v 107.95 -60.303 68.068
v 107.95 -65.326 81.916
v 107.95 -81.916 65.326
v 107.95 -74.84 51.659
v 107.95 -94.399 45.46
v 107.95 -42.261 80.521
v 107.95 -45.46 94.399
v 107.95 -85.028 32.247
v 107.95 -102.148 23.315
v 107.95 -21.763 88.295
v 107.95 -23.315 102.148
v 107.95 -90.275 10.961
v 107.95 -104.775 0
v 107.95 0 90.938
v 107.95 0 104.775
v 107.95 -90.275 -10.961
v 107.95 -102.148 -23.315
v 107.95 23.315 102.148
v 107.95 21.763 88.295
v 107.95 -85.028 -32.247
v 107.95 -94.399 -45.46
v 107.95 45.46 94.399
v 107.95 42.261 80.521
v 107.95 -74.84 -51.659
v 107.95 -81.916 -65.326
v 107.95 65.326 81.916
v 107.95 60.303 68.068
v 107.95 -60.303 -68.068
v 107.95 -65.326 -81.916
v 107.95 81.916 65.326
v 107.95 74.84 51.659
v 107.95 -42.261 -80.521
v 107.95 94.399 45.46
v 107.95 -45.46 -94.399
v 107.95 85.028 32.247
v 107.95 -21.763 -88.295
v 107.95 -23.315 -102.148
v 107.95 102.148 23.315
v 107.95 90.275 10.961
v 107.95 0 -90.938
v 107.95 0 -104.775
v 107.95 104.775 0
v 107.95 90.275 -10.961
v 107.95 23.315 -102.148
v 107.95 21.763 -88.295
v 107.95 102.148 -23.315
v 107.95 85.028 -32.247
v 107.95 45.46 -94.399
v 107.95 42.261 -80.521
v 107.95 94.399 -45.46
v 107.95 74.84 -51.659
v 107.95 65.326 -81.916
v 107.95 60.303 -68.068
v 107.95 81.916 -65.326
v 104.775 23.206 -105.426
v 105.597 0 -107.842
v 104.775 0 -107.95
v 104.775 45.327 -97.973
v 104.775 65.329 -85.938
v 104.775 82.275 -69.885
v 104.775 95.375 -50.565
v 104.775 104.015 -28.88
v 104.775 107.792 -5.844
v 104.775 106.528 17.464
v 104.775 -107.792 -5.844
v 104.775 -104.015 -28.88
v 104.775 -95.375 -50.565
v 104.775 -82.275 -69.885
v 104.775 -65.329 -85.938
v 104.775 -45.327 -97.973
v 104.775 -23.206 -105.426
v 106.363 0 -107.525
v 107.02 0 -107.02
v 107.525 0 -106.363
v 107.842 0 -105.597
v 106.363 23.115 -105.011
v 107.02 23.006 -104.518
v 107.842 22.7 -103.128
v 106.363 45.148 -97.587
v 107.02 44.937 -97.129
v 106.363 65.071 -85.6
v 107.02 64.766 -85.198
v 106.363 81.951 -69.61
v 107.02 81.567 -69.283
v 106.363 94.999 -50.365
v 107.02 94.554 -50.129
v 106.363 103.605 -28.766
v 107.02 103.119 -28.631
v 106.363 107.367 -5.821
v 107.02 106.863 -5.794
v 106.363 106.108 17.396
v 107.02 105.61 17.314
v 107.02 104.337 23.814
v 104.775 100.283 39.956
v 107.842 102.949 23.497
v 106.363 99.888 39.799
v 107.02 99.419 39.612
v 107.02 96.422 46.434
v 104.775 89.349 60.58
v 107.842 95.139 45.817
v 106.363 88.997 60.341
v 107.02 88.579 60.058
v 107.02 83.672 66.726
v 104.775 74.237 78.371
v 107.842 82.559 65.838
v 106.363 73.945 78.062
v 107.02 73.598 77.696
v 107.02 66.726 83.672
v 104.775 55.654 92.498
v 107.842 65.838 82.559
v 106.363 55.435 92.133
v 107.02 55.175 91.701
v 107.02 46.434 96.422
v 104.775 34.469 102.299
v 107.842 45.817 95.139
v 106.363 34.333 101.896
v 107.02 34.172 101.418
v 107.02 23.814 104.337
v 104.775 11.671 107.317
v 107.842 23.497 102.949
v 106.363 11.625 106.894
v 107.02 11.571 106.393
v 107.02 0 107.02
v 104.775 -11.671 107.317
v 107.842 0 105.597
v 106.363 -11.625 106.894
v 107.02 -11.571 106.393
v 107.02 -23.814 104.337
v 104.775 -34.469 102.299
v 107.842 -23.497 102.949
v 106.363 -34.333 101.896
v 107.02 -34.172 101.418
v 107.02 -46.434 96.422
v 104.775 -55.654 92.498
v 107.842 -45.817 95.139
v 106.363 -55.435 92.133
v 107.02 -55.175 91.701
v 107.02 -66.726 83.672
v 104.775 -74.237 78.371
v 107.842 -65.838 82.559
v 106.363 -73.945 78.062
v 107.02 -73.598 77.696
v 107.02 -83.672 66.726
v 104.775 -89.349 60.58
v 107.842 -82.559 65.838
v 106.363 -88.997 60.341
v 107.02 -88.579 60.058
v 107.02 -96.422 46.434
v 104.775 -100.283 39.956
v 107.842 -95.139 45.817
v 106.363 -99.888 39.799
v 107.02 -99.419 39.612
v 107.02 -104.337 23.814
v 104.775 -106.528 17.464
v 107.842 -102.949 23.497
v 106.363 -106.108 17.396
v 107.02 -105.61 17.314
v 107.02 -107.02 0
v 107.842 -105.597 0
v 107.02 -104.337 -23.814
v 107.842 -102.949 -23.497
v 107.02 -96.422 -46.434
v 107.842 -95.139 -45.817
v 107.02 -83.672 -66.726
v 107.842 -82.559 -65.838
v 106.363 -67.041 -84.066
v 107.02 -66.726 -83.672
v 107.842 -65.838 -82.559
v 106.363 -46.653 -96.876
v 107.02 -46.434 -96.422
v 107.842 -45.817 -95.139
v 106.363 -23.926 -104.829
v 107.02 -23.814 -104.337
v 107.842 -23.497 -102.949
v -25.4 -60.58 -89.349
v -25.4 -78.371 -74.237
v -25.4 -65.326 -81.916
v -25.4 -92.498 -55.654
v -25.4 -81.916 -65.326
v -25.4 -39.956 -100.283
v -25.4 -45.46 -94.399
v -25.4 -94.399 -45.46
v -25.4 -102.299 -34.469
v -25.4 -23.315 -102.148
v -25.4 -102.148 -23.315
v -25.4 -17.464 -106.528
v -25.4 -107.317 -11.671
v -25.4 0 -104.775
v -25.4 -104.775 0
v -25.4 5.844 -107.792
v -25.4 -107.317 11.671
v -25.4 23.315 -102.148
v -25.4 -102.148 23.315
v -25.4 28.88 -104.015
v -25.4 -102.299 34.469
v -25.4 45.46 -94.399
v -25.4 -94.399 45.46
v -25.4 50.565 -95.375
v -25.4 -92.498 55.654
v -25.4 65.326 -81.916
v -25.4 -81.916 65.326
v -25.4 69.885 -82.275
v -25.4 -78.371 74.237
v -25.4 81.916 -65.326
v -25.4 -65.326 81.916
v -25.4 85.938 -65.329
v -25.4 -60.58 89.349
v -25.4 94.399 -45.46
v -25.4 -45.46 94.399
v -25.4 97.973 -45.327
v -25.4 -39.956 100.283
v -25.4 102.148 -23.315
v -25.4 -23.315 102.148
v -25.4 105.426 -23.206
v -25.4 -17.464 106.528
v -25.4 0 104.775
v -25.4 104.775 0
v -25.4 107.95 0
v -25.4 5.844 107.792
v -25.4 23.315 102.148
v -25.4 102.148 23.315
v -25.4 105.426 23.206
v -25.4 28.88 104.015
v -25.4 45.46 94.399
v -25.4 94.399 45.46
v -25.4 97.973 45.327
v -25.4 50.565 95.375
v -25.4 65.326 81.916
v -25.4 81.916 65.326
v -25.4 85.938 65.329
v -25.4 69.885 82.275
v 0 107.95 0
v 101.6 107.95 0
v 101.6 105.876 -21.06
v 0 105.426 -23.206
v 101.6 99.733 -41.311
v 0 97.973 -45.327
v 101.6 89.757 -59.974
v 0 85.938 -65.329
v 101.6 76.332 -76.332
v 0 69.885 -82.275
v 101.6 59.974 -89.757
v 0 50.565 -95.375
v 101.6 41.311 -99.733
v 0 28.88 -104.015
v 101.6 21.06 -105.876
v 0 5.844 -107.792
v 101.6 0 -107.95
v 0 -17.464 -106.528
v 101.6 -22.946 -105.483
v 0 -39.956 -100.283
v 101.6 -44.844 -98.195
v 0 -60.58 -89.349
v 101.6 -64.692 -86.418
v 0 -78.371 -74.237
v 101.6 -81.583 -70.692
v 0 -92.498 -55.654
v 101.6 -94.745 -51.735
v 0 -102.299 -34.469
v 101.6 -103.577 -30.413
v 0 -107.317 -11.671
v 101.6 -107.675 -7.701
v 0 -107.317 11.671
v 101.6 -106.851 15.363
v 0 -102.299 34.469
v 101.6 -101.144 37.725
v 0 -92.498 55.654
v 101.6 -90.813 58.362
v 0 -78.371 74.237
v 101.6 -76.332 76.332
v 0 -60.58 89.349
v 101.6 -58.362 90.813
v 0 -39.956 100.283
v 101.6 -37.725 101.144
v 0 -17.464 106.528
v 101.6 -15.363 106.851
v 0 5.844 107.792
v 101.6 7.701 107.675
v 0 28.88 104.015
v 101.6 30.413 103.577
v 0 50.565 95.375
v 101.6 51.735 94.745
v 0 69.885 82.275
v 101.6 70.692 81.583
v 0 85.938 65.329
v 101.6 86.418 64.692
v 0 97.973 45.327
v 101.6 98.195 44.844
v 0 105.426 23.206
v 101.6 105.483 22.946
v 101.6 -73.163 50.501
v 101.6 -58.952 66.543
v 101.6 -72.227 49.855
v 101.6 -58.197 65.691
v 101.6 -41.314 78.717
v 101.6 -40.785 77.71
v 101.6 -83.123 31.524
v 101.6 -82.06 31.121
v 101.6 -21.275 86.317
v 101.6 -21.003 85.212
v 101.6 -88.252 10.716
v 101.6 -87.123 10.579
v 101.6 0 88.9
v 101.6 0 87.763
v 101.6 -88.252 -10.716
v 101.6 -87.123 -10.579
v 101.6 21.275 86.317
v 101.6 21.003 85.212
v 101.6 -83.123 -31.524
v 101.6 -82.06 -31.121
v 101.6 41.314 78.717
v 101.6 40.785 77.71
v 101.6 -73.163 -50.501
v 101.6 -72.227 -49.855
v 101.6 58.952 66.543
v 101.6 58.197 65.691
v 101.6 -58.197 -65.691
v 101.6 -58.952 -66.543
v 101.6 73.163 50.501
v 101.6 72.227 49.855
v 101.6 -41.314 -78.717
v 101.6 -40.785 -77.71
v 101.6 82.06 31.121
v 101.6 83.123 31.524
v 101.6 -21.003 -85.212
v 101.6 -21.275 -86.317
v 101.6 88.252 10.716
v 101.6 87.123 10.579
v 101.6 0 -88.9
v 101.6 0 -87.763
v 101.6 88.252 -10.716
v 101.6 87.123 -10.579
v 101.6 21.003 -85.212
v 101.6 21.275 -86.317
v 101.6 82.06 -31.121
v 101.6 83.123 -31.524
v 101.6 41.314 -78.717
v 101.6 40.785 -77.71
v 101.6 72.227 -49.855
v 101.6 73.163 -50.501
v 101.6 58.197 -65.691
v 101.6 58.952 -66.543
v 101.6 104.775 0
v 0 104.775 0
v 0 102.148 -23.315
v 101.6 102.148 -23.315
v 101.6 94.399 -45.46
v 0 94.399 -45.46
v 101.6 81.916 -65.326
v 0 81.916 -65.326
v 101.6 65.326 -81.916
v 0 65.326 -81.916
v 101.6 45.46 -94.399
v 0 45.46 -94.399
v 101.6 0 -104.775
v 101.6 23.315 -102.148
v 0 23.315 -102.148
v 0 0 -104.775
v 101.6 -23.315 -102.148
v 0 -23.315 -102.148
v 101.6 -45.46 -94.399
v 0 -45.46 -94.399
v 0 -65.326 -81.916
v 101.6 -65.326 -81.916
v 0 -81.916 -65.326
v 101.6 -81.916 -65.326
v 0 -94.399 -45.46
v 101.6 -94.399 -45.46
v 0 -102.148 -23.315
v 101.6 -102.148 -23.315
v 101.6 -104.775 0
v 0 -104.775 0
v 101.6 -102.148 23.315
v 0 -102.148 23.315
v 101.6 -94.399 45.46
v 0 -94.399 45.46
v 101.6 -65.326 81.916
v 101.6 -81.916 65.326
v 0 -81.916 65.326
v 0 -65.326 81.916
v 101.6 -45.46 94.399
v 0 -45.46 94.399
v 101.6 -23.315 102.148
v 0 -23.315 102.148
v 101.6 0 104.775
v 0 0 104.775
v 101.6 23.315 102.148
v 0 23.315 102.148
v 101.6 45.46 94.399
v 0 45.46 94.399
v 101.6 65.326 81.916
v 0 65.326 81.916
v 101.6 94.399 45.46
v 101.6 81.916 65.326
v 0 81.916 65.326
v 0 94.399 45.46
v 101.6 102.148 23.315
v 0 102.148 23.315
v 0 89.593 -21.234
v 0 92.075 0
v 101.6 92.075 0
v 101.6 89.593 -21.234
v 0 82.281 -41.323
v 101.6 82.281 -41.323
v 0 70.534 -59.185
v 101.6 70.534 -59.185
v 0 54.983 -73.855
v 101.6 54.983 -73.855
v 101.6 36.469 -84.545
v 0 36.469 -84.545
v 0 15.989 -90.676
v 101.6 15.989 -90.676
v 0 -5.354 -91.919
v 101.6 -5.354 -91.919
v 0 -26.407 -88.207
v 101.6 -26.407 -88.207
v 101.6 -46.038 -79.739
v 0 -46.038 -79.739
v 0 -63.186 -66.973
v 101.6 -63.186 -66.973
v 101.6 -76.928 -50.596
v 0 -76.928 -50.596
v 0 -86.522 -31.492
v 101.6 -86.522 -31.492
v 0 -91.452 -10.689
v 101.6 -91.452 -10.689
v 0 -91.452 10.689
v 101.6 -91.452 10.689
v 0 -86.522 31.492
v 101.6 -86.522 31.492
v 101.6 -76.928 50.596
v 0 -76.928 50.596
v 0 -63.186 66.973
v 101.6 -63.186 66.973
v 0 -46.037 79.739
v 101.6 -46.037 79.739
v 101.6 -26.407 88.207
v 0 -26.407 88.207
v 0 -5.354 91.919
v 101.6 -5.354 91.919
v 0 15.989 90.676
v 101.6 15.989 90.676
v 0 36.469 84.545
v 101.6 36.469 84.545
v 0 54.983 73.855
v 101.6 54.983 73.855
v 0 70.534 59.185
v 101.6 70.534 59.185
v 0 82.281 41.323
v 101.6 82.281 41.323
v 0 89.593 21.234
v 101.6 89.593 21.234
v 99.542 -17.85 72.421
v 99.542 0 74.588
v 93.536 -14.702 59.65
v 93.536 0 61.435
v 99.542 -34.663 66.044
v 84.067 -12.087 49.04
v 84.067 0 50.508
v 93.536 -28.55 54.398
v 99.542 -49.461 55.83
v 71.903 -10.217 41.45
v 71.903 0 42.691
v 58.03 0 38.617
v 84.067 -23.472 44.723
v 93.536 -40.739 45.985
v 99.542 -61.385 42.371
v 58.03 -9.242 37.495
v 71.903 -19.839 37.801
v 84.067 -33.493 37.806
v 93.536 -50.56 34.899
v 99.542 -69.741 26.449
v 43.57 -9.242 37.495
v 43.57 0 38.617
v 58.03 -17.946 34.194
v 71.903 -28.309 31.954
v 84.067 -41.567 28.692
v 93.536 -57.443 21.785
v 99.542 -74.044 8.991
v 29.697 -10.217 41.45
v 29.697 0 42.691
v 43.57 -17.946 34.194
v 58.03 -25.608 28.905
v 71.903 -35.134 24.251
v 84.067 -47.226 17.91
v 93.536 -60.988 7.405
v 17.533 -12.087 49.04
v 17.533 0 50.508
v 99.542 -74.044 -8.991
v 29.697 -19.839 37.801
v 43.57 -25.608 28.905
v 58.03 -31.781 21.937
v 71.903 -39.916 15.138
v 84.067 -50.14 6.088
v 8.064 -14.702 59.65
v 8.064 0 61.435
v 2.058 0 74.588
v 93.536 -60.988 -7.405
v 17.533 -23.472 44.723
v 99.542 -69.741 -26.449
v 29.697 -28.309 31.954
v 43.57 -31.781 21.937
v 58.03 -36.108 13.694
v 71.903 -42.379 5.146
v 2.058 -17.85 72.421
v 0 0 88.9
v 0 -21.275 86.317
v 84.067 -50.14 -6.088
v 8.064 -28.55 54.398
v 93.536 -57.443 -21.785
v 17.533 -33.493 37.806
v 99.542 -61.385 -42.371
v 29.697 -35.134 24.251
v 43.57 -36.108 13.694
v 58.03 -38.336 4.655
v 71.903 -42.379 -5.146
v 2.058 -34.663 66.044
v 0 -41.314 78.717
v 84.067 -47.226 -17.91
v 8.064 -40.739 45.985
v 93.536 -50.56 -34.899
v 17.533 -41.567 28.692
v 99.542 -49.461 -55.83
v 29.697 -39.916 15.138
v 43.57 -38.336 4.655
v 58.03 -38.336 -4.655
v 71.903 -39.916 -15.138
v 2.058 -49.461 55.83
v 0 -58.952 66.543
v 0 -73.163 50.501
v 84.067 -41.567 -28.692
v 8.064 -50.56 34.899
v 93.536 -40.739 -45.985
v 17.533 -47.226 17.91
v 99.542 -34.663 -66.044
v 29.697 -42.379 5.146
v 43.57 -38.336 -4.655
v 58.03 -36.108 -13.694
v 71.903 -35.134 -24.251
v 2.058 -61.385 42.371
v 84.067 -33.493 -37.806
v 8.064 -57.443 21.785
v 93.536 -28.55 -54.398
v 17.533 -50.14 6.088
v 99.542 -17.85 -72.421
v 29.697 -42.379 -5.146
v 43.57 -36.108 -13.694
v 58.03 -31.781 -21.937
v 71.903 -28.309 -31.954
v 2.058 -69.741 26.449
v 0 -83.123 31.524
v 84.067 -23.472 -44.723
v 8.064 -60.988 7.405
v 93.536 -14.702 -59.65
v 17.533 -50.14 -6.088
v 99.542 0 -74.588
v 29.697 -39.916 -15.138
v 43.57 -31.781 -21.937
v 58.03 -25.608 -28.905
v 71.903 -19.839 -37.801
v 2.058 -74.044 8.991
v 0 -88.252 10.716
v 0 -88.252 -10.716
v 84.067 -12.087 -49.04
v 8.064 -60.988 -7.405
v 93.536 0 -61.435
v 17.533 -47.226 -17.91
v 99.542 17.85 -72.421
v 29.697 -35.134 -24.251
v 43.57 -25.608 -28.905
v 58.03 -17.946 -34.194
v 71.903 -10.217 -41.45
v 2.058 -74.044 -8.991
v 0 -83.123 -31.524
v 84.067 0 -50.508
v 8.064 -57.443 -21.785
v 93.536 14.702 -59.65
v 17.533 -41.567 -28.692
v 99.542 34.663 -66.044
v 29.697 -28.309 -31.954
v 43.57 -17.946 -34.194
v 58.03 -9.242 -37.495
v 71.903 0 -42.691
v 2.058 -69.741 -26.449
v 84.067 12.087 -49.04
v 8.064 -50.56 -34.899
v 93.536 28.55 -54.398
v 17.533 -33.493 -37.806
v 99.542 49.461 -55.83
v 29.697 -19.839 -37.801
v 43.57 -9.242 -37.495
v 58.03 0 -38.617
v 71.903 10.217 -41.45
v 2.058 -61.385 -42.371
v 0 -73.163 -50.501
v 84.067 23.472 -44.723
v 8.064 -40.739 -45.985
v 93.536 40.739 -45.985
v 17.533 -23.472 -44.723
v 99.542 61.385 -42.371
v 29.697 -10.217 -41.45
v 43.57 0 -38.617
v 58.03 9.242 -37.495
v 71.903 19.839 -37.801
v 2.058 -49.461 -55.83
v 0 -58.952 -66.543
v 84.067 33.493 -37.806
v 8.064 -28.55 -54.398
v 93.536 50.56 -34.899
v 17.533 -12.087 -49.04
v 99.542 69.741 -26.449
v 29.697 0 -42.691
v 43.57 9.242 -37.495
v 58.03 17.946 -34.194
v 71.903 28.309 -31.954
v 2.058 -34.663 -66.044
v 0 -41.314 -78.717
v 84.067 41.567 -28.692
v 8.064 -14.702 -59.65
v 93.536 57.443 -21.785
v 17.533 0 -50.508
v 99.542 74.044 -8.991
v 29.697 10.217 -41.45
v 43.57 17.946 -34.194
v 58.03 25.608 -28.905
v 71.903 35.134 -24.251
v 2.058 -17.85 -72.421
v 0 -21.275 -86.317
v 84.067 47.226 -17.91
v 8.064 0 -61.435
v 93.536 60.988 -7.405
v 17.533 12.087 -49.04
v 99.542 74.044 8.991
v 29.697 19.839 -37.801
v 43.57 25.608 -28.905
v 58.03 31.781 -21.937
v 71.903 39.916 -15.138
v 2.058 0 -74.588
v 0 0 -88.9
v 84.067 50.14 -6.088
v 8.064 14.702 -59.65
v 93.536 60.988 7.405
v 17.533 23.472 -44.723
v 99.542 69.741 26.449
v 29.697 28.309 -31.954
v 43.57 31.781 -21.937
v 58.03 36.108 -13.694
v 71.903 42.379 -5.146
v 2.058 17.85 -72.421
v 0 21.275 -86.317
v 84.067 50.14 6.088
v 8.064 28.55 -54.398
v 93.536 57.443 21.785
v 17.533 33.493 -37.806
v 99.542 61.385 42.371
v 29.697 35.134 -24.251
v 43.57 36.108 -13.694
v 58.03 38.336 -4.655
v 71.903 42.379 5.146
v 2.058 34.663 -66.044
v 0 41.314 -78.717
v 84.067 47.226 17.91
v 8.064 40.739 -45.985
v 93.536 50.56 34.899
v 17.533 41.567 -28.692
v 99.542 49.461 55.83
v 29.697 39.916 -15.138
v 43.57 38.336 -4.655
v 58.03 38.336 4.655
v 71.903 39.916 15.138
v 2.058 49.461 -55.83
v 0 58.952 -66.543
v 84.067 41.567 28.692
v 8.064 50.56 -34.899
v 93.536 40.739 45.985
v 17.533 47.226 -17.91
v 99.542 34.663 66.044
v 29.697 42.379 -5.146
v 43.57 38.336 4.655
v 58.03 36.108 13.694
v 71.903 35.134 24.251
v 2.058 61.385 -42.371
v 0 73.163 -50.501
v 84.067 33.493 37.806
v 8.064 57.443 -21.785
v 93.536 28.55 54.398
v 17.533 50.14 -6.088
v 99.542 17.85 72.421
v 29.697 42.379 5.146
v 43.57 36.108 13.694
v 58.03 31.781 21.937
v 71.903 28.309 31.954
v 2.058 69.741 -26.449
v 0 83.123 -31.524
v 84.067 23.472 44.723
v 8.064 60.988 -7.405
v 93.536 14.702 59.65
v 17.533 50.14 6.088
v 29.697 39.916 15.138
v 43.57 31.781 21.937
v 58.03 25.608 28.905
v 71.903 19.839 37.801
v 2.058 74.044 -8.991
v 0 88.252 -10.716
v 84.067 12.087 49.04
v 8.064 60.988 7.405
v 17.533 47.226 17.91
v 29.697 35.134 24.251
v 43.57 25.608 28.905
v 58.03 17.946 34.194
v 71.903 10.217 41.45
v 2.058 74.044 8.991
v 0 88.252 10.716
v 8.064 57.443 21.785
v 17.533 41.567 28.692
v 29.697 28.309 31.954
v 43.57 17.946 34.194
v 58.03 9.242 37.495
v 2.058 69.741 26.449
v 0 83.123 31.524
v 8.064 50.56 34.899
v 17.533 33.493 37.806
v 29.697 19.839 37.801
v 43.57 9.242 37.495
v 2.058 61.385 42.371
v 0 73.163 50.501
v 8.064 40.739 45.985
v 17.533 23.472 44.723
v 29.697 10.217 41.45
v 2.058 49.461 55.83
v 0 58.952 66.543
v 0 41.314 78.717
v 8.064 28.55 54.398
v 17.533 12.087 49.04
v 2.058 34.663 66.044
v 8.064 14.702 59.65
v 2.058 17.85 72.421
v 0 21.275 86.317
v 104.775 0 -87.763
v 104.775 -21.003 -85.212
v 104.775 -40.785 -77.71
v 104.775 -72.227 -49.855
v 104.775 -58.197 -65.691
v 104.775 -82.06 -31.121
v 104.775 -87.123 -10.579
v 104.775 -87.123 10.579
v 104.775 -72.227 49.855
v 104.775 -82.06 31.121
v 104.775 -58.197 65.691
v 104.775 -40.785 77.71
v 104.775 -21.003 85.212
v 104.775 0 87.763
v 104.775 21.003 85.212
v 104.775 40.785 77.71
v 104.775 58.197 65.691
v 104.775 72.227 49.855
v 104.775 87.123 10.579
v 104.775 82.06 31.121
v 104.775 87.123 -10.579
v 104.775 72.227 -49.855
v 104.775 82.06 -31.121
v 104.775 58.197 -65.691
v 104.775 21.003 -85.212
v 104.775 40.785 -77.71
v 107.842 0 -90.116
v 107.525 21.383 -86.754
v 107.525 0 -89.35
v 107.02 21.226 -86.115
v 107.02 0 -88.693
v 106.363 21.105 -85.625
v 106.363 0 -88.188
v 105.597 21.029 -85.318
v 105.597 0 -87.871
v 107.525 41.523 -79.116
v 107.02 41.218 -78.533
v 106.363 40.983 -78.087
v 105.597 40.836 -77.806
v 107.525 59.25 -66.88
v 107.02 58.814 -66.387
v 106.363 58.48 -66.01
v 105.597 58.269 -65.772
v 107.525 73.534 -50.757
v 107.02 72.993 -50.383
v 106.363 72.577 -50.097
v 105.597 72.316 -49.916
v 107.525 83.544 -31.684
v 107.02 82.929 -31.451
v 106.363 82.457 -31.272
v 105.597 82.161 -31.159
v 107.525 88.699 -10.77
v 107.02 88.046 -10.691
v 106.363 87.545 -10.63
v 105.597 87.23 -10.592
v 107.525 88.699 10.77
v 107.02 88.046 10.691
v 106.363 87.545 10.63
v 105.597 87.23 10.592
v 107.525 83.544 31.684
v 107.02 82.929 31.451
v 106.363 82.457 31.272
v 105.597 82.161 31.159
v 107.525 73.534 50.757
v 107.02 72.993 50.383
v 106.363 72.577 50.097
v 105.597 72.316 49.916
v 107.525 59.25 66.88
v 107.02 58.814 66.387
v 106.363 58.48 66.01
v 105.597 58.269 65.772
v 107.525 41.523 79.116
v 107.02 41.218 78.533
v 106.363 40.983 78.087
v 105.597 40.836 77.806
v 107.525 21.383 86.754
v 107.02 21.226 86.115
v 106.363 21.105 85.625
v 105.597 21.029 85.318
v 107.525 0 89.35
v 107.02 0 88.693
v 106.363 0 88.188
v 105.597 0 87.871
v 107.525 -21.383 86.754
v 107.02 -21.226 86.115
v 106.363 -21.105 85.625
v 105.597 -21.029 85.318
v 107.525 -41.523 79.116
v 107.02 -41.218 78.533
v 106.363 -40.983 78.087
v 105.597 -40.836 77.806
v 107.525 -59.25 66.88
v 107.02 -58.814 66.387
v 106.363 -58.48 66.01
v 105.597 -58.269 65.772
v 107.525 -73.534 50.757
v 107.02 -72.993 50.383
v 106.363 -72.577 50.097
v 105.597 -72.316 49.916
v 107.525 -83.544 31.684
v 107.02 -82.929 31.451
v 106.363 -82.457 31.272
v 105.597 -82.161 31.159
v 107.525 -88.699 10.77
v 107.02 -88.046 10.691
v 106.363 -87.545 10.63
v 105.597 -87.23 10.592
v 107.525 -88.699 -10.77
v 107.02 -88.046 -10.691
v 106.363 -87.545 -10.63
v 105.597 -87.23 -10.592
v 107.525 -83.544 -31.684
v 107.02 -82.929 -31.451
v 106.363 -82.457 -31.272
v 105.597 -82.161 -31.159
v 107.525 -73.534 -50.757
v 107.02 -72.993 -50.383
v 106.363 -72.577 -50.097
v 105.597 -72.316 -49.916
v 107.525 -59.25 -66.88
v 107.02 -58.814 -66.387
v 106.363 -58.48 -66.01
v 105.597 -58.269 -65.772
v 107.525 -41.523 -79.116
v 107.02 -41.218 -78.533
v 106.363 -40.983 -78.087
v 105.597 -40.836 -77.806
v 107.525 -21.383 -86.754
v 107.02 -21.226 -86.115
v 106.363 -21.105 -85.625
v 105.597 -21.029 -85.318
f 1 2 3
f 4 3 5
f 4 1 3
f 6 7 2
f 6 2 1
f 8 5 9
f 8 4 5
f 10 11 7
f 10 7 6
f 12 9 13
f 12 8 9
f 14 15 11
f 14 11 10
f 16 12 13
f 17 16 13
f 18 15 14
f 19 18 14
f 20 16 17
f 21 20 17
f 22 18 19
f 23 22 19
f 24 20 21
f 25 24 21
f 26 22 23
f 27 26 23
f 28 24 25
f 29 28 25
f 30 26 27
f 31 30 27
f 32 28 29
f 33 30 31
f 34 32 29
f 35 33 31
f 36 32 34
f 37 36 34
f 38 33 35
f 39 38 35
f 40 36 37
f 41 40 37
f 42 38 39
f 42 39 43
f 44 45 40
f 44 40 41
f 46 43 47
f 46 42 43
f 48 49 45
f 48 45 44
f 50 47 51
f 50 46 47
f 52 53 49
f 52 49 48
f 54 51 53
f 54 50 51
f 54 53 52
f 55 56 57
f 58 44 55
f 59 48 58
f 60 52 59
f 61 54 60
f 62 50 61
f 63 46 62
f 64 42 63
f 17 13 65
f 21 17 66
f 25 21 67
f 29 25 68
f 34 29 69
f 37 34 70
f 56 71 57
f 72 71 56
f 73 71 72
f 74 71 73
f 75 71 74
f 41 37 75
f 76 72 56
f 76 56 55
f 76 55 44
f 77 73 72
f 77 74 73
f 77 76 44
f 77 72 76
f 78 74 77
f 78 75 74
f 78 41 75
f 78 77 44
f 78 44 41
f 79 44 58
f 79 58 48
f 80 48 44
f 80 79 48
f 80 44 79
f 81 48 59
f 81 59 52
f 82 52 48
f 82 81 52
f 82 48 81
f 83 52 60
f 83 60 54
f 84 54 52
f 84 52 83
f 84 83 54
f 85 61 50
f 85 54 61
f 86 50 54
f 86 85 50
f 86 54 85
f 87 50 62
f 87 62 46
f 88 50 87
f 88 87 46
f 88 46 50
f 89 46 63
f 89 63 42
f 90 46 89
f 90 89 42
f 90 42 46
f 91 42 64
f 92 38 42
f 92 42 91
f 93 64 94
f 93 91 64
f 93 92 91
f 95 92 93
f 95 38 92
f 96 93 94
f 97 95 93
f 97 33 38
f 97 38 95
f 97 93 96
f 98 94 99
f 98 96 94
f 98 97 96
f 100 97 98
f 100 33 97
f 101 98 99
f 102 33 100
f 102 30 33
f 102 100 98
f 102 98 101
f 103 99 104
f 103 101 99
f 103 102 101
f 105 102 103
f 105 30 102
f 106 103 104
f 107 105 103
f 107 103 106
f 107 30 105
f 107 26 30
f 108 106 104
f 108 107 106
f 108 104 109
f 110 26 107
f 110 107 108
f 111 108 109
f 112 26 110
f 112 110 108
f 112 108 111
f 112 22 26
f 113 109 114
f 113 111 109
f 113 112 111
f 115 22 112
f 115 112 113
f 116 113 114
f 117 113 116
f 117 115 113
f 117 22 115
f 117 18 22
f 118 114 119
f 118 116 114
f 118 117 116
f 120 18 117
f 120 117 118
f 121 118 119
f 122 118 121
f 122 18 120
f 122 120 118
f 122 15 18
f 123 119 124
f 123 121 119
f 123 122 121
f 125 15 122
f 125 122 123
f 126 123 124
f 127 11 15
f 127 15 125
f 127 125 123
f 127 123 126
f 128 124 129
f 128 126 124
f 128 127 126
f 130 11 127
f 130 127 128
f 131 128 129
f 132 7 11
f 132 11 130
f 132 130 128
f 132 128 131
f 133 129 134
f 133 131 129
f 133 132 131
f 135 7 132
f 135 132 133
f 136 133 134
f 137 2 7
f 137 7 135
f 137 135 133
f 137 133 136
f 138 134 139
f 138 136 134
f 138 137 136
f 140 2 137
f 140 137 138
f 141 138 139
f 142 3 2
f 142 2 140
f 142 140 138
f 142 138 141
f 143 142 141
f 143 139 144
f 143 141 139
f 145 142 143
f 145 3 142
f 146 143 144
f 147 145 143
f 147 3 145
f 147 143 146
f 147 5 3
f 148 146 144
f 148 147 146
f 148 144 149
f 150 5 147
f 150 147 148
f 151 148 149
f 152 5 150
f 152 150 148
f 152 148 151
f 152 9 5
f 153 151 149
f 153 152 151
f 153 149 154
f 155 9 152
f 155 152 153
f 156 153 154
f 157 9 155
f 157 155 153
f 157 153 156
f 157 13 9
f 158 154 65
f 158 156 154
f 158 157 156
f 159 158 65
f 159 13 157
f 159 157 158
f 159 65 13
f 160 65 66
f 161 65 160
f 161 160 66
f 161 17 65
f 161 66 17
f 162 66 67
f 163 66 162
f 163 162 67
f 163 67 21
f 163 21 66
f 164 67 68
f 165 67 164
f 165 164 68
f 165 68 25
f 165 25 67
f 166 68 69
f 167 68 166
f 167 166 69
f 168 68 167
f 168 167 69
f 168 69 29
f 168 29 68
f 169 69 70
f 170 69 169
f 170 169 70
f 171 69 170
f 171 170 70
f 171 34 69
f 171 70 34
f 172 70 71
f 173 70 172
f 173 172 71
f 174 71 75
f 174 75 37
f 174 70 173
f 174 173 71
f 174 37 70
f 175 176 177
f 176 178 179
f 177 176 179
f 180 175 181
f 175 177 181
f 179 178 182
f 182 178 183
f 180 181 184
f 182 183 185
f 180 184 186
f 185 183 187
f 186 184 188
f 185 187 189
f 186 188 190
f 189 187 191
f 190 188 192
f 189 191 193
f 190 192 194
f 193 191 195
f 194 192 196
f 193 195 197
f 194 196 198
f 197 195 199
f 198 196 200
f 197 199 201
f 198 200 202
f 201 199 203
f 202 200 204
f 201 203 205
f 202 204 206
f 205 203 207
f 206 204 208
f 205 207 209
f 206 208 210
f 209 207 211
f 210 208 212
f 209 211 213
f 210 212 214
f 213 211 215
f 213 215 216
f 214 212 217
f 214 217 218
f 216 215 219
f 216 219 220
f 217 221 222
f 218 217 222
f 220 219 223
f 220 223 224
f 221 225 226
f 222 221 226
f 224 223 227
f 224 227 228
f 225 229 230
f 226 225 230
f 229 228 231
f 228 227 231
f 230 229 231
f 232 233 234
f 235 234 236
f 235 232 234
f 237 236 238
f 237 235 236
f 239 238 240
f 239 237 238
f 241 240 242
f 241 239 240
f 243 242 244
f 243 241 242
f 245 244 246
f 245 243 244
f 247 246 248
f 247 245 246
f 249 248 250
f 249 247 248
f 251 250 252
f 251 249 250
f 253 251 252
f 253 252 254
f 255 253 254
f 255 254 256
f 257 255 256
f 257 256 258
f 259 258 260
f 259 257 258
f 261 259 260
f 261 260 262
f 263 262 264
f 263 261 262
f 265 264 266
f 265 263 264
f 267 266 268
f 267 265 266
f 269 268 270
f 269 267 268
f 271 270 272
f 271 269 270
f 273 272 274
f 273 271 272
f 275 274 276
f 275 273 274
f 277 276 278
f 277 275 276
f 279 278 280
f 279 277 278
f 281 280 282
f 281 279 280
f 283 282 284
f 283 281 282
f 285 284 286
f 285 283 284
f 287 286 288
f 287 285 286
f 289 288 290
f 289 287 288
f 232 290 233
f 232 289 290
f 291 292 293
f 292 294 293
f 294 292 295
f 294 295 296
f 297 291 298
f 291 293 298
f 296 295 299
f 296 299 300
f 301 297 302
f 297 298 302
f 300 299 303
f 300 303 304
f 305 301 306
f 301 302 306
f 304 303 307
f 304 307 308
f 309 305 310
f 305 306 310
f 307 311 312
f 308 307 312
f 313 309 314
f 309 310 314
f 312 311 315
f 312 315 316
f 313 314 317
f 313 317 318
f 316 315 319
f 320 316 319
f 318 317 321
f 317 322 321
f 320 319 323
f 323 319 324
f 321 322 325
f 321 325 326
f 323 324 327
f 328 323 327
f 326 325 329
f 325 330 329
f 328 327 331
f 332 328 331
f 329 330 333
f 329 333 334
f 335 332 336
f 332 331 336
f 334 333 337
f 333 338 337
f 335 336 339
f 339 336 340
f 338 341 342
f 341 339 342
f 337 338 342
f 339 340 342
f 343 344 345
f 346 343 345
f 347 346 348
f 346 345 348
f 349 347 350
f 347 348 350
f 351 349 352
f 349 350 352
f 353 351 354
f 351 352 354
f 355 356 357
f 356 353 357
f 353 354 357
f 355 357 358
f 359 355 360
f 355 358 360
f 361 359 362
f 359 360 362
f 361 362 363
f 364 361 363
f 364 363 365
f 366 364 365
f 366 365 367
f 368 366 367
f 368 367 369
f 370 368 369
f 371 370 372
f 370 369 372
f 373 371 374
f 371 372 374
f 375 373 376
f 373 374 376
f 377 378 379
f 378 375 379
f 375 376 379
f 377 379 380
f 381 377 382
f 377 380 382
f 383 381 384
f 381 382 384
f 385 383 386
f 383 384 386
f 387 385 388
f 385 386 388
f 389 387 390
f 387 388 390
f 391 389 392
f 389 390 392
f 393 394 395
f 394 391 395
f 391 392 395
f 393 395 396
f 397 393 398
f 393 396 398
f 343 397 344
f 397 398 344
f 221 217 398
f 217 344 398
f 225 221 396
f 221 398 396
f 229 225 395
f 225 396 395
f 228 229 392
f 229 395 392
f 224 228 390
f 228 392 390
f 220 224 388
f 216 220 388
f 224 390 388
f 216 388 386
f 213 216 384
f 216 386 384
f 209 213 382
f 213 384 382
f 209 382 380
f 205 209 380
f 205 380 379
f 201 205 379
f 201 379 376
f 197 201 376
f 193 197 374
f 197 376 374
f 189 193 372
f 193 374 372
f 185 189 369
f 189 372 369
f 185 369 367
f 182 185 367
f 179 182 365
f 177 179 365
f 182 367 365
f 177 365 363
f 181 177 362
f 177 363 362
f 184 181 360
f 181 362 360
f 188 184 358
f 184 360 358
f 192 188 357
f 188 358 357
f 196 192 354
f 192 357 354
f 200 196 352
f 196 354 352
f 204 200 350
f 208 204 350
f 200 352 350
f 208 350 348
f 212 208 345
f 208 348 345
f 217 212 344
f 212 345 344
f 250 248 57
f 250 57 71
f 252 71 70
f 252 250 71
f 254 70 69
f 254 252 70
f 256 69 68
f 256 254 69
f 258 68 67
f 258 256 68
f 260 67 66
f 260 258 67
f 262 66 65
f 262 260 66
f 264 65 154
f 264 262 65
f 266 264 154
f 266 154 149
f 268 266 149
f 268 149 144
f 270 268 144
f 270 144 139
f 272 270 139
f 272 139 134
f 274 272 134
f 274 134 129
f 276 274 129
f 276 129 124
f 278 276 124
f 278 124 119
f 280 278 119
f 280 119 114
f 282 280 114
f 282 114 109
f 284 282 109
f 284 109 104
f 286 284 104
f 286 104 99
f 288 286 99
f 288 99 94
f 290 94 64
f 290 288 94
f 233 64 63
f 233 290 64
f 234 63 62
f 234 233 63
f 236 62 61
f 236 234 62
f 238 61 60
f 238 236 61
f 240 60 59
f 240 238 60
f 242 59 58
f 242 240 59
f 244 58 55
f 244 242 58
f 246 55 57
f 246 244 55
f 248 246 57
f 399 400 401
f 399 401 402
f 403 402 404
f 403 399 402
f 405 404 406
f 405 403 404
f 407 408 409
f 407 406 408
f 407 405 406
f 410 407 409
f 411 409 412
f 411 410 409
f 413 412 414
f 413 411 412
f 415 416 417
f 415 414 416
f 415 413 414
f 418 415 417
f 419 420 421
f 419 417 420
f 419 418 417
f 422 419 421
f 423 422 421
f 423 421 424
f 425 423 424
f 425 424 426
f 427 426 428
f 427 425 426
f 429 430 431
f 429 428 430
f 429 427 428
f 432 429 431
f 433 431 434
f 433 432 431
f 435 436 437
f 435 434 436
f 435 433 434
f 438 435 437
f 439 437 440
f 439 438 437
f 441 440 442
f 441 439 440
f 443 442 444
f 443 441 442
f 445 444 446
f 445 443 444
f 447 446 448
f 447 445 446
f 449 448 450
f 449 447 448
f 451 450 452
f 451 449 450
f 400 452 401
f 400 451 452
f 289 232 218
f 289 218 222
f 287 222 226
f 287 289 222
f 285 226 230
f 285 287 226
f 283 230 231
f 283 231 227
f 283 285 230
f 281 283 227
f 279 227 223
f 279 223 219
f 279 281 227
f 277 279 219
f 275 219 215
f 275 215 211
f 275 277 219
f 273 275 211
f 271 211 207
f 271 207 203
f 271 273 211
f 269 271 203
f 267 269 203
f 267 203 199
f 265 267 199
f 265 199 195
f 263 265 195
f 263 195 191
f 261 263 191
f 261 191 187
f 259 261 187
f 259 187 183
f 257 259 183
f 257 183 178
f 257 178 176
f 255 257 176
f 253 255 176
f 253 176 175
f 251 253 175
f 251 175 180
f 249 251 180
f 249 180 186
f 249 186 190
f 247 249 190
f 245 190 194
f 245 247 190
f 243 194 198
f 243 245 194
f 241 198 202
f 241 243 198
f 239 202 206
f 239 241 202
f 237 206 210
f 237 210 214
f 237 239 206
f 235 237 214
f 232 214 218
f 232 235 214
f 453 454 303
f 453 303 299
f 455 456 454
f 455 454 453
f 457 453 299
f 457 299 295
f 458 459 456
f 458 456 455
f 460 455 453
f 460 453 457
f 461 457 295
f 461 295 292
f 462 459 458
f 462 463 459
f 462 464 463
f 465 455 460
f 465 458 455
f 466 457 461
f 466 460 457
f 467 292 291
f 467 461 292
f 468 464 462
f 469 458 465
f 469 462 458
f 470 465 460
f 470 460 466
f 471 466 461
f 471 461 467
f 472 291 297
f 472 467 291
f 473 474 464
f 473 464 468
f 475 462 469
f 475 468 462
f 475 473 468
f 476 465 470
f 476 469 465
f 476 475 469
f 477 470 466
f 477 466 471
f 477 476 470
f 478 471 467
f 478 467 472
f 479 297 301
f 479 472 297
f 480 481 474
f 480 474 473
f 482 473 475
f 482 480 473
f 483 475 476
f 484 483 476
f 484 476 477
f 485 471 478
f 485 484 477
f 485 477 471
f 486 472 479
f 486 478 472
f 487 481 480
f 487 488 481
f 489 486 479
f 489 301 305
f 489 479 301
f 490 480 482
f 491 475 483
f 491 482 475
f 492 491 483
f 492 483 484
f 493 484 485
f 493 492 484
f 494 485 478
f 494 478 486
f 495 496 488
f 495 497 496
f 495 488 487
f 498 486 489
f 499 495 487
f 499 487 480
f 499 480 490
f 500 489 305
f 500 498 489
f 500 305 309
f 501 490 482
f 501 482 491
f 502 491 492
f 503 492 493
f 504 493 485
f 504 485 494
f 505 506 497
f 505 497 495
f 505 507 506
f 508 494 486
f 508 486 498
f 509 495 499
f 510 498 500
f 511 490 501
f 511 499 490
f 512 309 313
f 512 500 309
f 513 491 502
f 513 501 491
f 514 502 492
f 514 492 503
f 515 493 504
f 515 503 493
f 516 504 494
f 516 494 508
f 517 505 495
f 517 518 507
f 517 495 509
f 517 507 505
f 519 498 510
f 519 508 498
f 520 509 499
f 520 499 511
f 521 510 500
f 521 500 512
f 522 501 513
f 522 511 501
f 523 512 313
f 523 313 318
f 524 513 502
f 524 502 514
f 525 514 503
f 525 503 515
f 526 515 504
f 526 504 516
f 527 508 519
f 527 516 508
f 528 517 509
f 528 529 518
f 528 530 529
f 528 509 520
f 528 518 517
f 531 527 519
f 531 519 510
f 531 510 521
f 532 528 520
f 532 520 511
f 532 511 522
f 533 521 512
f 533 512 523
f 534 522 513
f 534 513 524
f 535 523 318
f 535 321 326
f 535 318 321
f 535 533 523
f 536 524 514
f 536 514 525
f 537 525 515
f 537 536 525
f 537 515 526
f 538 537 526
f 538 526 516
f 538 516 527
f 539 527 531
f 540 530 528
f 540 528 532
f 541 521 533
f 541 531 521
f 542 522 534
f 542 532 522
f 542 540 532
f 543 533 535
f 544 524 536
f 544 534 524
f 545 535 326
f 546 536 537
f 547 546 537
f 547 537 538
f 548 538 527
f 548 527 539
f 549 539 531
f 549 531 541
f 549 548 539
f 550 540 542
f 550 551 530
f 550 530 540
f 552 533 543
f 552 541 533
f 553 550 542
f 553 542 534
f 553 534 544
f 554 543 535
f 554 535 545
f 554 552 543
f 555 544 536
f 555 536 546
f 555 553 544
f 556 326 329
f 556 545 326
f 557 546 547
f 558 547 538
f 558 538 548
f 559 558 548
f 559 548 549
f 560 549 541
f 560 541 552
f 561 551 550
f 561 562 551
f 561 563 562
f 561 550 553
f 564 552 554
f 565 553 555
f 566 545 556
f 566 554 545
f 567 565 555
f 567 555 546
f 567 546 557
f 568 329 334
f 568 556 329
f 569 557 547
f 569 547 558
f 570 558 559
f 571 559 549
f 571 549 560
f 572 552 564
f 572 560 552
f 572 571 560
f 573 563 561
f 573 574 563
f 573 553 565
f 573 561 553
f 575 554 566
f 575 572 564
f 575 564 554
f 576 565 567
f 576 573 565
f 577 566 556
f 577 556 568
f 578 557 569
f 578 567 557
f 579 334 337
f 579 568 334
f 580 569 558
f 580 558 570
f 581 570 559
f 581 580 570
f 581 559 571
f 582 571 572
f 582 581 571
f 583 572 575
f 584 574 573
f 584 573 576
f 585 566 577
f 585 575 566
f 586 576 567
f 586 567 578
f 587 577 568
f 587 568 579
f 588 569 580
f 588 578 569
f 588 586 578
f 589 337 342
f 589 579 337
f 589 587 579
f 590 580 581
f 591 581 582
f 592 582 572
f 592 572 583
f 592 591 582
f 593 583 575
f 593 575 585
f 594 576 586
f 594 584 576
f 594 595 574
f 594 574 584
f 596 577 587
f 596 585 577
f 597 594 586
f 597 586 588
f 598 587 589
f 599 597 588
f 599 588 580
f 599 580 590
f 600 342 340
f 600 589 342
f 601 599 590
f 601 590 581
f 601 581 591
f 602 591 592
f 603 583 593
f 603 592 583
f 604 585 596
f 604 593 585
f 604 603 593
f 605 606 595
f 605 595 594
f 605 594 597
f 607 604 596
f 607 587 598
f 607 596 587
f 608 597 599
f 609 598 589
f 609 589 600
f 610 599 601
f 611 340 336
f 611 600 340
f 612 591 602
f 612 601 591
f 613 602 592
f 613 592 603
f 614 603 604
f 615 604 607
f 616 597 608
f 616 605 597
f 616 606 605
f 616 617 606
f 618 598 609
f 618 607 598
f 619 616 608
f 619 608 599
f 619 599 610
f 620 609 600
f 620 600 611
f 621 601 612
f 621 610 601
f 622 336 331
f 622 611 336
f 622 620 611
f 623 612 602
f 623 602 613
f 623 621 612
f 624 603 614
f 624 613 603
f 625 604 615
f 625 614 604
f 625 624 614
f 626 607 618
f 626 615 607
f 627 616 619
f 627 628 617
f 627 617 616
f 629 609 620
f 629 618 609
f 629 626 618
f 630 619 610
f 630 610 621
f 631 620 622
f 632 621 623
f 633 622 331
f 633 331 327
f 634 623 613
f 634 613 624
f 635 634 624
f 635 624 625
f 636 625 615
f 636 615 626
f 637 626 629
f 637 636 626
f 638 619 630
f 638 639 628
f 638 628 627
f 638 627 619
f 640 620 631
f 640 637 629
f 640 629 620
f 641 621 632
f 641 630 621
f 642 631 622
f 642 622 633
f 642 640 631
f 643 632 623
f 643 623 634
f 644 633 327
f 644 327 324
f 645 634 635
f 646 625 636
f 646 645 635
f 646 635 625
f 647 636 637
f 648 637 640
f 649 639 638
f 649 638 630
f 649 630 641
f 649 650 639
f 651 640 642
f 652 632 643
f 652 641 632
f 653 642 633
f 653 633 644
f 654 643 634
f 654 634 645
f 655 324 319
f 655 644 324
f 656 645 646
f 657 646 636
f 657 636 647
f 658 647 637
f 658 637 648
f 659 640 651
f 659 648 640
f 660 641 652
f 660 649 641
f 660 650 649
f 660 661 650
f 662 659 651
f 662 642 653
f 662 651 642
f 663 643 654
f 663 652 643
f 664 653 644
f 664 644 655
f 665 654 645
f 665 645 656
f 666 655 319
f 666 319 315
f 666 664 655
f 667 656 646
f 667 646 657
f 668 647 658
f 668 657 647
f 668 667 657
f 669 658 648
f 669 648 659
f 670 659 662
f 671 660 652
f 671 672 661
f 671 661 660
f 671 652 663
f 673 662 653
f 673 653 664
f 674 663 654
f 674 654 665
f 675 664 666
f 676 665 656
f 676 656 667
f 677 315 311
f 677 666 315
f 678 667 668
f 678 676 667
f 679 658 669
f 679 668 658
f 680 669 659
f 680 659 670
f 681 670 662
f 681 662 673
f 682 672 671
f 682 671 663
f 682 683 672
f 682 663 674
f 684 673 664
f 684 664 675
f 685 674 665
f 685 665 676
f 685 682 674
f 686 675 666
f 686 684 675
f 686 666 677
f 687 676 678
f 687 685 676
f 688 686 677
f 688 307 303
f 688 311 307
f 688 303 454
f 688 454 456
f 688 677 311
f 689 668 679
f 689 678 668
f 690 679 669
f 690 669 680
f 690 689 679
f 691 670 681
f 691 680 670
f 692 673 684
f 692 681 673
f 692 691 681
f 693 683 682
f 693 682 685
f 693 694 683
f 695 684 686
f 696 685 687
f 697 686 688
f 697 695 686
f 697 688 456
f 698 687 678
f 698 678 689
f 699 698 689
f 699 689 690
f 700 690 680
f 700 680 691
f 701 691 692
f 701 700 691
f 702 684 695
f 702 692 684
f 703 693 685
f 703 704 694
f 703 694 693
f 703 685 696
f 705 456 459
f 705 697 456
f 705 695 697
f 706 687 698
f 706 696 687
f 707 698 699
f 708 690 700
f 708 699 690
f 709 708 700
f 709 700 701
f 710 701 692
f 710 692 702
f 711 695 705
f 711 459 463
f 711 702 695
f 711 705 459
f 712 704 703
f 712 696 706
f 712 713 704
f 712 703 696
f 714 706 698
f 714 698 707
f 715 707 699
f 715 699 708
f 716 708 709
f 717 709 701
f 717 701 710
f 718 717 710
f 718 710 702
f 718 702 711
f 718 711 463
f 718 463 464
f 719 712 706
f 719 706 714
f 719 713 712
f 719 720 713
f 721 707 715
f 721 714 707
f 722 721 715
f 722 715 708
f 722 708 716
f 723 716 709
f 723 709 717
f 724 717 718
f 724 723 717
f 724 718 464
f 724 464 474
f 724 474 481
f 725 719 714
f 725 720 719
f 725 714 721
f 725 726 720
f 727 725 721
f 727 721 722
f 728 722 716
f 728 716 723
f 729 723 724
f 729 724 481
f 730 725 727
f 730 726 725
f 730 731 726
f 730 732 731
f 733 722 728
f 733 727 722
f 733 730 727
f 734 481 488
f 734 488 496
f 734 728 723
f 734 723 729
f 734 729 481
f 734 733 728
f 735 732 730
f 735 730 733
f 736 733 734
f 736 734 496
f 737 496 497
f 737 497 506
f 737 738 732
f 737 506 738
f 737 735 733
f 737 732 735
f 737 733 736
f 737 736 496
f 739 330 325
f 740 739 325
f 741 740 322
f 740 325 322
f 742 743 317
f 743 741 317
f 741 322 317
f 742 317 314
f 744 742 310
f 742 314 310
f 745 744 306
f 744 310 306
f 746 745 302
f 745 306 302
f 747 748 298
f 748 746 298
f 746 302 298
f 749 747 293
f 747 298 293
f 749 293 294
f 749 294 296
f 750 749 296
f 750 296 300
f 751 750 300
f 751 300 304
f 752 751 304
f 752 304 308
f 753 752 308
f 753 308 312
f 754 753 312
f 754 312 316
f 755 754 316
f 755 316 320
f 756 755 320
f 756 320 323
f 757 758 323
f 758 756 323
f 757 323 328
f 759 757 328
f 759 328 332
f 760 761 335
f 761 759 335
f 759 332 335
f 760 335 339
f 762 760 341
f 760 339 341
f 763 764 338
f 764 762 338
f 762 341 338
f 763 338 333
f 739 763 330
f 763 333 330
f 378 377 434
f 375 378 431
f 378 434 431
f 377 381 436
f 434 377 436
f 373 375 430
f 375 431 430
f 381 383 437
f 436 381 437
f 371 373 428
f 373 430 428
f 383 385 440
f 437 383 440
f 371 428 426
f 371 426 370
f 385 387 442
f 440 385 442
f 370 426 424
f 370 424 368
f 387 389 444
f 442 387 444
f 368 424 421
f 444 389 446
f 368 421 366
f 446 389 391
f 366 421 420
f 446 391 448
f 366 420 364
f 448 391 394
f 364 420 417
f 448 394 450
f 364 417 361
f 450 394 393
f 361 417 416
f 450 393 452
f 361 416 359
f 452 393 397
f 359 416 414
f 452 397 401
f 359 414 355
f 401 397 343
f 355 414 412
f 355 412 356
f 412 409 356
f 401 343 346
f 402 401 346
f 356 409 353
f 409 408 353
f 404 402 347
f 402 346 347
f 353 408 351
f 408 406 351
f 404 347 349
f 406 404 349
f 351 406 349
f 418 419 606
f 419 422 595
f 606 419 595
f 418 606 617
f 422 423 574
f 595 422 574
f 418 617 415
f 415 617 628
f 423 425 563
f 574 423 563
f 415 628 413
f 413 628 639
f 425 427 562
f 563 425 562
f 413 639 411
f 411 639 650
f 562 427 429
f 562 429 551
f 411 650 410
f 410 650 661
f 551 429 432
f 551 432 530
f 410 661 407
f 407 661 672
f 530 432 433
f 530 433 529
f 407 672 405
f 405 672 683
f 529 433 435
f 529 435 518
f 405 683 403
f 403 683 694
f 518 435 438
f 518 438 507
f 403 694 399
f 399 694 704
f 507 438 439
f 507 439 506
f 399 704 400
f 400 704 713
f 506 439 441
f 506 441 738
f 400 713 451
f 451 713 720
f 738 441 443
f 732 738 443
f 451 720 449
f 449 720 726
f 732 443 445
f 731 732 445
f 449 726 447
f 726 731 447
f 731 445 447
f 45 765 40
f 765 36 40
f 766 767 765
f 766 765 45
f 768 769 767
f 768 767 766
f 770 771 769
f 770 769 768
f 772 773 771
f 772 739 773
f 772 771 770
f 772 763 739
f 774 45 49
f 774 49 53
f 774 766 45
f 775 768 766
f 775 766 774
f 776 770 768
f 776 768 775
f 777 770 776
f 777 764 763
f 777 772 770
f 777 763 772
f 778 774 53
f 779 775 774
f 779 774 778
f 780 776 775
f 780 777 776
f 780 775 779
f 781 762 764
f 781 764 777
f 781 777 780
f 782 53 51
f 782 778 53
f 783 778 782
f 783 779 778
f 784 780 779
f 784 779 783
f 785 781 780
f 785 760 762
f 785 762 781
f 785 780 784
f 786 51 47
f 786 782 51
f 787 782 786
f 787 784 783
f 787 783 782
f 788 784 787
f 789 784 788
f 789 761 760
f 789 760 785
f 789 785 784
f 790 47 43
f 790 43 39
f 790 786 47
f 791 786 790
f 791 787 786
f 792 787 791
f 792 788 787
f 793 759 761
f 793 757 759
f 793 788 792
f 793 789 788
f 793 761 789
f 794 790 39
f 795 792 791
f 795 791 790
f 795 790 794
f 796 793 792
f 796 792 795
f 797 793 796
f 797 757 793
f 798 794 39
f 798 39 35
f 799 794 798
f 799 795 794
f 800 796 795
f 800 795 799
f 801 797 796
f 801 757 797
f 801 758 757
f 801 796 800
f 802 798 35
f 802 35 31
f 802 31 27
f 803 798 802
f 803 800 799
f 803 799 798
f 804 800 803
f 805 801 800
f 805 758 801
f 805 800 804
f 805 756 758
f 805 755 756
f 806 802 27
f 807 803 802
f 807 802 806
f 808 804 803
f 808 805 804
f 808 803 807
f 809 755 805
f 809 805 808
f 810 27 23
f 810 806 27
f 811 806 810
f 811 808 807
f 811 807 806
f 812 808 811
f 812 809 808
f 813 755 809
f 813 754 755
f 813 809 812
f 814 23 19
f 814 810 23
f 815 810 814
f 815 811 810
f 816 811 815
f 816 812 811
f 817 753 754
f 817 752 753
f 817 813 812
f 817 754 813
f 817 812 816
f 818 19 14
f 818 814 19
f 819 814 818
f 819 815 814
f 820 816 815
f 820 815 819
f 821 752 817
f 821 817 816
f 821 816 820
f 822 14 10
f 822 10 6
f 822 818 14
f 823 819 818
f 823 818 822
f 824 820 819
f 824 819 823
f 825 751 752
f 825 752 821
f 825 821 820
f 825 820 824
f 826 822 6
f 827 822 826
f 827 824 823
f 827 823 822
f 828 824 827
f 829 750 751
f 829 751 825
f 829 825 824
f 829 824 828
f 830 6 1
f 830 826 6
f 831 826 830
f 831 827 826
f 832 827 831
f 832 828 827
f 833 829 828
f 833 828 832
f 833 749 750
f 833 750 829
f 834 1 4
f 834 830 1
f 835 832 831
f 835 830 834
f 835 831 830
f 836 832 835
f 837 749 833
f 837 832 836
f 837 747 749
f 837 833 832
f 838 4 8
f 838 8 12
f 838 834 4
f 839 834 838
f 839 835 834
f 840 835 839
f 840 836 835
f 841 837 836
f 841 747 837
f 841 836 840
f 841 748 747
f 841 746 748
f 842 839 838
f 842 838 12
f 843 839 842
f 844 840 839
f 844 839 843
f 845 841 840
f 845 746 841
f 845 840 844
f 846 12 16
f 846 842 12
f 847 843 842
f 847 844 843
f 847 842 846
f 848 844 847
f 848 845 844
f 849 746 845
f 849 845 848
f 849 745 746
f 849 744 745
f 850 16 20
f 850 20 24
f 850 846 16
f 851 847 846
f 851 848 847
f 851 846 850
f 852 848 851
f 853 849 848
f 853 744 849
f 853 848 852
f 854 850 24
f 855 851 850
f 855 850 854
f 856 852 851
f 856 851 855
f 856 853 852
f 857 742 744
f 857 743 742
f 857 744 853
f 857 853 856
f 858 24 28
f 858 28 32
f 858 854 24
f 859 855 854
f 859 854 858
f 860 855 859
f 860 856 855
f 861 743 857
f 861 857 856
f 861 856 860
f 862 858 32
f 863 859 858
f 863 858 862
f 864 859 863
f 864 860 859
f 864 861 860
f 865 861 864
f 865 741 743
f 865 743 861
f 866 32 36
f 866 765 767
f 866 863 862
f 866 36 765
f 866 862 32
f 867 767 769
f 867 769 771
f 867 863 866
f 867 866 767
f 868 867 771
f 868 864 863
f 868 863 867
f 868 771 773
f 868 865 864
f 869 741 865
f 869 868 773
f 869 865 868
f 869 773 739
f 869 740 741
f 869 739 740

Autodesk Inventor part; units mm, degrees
ref_plane "YZ Plane" through (0, 0, 0) normal (1, 0, 0) x (0, 1, 0)
ref_plane "XZ Plane" through (0, 0, 0) normal (0, 1, 0) x (-1, 0, 0)
sketch "Sketch1" plane through (0, 0, 0) normal (1, 0, 0) x (0, 1, 0)
  circle A0 centre (0, 0) radius 88.9
  circle A1 centre (0, 0) radius 92.075
  dimension "d0" = 177.8
  dimension "d1" = 184.15
extrude "Extrusion1" add sketch "Sketch1" along normal blind 101.6
ref_plane "Work Plane1" through (50.8, 0, 0) normal (1, 0, 0) x (0, 0, -1)
sketch "Sketch5" plane through (0, 0, 0) normal (0, 1, 0) x (-1, 0, 0)
  line L0 (20.32, 0) -> (-121.92, 0) projected
  line L1 (0, -88.9) -> (0, 88.9) projected
  line L2 (0, 88.9) -> (-101.6, 88.9)
  line L3 (-101.6, 92.075) -> (-101.6, -92.075) projected
  line L4 (-101.6, -88.9) -> (-101.6, 88.9) projected
  arc A0 (-101.6, 88.9) -> (0, 88.9) centre (-50.8, 88.9) ccw
  point P0 (0, 0)
  dimension "d23" = 50.8
revolve "Revolution1" add sketch "Sketch5" angle 360 about axis through (-10, 0, 0) along (1, 0, 0) contours A0 L2
sketch "Sketch6" plane through (0, 0, 0) normal (1, 0, 0) x (0, 1, 0)
  circle A0 centre (0, 0) radius 104.775
  circle A1 centre (0, 0) radius 107.95
  dimension "d17" = 215.9
  dimension "d18" = 209.55
extrude "Extrusion3" add sketch "Sketch6" along normal blind 101.6 and the other way blind 25.4
sketch "Sketch7" plane through (101.6, 0, 0) normal (1, 0, 0) x (0, 0, -1)
  circle A0 centre (0, 0) radius 107.95
  circle A1 centre (0, 0) radius 87.7627
extrude "Extrusion4" add sketch "Sketch7" along normal blind 6.35
fillet "Fillet1" radius 3.175 2 edges at (107.95, 0, 87.7627) (107.95, 0, 107.95)
properties part number "AirBagV1" material "Steel, Alloy"
